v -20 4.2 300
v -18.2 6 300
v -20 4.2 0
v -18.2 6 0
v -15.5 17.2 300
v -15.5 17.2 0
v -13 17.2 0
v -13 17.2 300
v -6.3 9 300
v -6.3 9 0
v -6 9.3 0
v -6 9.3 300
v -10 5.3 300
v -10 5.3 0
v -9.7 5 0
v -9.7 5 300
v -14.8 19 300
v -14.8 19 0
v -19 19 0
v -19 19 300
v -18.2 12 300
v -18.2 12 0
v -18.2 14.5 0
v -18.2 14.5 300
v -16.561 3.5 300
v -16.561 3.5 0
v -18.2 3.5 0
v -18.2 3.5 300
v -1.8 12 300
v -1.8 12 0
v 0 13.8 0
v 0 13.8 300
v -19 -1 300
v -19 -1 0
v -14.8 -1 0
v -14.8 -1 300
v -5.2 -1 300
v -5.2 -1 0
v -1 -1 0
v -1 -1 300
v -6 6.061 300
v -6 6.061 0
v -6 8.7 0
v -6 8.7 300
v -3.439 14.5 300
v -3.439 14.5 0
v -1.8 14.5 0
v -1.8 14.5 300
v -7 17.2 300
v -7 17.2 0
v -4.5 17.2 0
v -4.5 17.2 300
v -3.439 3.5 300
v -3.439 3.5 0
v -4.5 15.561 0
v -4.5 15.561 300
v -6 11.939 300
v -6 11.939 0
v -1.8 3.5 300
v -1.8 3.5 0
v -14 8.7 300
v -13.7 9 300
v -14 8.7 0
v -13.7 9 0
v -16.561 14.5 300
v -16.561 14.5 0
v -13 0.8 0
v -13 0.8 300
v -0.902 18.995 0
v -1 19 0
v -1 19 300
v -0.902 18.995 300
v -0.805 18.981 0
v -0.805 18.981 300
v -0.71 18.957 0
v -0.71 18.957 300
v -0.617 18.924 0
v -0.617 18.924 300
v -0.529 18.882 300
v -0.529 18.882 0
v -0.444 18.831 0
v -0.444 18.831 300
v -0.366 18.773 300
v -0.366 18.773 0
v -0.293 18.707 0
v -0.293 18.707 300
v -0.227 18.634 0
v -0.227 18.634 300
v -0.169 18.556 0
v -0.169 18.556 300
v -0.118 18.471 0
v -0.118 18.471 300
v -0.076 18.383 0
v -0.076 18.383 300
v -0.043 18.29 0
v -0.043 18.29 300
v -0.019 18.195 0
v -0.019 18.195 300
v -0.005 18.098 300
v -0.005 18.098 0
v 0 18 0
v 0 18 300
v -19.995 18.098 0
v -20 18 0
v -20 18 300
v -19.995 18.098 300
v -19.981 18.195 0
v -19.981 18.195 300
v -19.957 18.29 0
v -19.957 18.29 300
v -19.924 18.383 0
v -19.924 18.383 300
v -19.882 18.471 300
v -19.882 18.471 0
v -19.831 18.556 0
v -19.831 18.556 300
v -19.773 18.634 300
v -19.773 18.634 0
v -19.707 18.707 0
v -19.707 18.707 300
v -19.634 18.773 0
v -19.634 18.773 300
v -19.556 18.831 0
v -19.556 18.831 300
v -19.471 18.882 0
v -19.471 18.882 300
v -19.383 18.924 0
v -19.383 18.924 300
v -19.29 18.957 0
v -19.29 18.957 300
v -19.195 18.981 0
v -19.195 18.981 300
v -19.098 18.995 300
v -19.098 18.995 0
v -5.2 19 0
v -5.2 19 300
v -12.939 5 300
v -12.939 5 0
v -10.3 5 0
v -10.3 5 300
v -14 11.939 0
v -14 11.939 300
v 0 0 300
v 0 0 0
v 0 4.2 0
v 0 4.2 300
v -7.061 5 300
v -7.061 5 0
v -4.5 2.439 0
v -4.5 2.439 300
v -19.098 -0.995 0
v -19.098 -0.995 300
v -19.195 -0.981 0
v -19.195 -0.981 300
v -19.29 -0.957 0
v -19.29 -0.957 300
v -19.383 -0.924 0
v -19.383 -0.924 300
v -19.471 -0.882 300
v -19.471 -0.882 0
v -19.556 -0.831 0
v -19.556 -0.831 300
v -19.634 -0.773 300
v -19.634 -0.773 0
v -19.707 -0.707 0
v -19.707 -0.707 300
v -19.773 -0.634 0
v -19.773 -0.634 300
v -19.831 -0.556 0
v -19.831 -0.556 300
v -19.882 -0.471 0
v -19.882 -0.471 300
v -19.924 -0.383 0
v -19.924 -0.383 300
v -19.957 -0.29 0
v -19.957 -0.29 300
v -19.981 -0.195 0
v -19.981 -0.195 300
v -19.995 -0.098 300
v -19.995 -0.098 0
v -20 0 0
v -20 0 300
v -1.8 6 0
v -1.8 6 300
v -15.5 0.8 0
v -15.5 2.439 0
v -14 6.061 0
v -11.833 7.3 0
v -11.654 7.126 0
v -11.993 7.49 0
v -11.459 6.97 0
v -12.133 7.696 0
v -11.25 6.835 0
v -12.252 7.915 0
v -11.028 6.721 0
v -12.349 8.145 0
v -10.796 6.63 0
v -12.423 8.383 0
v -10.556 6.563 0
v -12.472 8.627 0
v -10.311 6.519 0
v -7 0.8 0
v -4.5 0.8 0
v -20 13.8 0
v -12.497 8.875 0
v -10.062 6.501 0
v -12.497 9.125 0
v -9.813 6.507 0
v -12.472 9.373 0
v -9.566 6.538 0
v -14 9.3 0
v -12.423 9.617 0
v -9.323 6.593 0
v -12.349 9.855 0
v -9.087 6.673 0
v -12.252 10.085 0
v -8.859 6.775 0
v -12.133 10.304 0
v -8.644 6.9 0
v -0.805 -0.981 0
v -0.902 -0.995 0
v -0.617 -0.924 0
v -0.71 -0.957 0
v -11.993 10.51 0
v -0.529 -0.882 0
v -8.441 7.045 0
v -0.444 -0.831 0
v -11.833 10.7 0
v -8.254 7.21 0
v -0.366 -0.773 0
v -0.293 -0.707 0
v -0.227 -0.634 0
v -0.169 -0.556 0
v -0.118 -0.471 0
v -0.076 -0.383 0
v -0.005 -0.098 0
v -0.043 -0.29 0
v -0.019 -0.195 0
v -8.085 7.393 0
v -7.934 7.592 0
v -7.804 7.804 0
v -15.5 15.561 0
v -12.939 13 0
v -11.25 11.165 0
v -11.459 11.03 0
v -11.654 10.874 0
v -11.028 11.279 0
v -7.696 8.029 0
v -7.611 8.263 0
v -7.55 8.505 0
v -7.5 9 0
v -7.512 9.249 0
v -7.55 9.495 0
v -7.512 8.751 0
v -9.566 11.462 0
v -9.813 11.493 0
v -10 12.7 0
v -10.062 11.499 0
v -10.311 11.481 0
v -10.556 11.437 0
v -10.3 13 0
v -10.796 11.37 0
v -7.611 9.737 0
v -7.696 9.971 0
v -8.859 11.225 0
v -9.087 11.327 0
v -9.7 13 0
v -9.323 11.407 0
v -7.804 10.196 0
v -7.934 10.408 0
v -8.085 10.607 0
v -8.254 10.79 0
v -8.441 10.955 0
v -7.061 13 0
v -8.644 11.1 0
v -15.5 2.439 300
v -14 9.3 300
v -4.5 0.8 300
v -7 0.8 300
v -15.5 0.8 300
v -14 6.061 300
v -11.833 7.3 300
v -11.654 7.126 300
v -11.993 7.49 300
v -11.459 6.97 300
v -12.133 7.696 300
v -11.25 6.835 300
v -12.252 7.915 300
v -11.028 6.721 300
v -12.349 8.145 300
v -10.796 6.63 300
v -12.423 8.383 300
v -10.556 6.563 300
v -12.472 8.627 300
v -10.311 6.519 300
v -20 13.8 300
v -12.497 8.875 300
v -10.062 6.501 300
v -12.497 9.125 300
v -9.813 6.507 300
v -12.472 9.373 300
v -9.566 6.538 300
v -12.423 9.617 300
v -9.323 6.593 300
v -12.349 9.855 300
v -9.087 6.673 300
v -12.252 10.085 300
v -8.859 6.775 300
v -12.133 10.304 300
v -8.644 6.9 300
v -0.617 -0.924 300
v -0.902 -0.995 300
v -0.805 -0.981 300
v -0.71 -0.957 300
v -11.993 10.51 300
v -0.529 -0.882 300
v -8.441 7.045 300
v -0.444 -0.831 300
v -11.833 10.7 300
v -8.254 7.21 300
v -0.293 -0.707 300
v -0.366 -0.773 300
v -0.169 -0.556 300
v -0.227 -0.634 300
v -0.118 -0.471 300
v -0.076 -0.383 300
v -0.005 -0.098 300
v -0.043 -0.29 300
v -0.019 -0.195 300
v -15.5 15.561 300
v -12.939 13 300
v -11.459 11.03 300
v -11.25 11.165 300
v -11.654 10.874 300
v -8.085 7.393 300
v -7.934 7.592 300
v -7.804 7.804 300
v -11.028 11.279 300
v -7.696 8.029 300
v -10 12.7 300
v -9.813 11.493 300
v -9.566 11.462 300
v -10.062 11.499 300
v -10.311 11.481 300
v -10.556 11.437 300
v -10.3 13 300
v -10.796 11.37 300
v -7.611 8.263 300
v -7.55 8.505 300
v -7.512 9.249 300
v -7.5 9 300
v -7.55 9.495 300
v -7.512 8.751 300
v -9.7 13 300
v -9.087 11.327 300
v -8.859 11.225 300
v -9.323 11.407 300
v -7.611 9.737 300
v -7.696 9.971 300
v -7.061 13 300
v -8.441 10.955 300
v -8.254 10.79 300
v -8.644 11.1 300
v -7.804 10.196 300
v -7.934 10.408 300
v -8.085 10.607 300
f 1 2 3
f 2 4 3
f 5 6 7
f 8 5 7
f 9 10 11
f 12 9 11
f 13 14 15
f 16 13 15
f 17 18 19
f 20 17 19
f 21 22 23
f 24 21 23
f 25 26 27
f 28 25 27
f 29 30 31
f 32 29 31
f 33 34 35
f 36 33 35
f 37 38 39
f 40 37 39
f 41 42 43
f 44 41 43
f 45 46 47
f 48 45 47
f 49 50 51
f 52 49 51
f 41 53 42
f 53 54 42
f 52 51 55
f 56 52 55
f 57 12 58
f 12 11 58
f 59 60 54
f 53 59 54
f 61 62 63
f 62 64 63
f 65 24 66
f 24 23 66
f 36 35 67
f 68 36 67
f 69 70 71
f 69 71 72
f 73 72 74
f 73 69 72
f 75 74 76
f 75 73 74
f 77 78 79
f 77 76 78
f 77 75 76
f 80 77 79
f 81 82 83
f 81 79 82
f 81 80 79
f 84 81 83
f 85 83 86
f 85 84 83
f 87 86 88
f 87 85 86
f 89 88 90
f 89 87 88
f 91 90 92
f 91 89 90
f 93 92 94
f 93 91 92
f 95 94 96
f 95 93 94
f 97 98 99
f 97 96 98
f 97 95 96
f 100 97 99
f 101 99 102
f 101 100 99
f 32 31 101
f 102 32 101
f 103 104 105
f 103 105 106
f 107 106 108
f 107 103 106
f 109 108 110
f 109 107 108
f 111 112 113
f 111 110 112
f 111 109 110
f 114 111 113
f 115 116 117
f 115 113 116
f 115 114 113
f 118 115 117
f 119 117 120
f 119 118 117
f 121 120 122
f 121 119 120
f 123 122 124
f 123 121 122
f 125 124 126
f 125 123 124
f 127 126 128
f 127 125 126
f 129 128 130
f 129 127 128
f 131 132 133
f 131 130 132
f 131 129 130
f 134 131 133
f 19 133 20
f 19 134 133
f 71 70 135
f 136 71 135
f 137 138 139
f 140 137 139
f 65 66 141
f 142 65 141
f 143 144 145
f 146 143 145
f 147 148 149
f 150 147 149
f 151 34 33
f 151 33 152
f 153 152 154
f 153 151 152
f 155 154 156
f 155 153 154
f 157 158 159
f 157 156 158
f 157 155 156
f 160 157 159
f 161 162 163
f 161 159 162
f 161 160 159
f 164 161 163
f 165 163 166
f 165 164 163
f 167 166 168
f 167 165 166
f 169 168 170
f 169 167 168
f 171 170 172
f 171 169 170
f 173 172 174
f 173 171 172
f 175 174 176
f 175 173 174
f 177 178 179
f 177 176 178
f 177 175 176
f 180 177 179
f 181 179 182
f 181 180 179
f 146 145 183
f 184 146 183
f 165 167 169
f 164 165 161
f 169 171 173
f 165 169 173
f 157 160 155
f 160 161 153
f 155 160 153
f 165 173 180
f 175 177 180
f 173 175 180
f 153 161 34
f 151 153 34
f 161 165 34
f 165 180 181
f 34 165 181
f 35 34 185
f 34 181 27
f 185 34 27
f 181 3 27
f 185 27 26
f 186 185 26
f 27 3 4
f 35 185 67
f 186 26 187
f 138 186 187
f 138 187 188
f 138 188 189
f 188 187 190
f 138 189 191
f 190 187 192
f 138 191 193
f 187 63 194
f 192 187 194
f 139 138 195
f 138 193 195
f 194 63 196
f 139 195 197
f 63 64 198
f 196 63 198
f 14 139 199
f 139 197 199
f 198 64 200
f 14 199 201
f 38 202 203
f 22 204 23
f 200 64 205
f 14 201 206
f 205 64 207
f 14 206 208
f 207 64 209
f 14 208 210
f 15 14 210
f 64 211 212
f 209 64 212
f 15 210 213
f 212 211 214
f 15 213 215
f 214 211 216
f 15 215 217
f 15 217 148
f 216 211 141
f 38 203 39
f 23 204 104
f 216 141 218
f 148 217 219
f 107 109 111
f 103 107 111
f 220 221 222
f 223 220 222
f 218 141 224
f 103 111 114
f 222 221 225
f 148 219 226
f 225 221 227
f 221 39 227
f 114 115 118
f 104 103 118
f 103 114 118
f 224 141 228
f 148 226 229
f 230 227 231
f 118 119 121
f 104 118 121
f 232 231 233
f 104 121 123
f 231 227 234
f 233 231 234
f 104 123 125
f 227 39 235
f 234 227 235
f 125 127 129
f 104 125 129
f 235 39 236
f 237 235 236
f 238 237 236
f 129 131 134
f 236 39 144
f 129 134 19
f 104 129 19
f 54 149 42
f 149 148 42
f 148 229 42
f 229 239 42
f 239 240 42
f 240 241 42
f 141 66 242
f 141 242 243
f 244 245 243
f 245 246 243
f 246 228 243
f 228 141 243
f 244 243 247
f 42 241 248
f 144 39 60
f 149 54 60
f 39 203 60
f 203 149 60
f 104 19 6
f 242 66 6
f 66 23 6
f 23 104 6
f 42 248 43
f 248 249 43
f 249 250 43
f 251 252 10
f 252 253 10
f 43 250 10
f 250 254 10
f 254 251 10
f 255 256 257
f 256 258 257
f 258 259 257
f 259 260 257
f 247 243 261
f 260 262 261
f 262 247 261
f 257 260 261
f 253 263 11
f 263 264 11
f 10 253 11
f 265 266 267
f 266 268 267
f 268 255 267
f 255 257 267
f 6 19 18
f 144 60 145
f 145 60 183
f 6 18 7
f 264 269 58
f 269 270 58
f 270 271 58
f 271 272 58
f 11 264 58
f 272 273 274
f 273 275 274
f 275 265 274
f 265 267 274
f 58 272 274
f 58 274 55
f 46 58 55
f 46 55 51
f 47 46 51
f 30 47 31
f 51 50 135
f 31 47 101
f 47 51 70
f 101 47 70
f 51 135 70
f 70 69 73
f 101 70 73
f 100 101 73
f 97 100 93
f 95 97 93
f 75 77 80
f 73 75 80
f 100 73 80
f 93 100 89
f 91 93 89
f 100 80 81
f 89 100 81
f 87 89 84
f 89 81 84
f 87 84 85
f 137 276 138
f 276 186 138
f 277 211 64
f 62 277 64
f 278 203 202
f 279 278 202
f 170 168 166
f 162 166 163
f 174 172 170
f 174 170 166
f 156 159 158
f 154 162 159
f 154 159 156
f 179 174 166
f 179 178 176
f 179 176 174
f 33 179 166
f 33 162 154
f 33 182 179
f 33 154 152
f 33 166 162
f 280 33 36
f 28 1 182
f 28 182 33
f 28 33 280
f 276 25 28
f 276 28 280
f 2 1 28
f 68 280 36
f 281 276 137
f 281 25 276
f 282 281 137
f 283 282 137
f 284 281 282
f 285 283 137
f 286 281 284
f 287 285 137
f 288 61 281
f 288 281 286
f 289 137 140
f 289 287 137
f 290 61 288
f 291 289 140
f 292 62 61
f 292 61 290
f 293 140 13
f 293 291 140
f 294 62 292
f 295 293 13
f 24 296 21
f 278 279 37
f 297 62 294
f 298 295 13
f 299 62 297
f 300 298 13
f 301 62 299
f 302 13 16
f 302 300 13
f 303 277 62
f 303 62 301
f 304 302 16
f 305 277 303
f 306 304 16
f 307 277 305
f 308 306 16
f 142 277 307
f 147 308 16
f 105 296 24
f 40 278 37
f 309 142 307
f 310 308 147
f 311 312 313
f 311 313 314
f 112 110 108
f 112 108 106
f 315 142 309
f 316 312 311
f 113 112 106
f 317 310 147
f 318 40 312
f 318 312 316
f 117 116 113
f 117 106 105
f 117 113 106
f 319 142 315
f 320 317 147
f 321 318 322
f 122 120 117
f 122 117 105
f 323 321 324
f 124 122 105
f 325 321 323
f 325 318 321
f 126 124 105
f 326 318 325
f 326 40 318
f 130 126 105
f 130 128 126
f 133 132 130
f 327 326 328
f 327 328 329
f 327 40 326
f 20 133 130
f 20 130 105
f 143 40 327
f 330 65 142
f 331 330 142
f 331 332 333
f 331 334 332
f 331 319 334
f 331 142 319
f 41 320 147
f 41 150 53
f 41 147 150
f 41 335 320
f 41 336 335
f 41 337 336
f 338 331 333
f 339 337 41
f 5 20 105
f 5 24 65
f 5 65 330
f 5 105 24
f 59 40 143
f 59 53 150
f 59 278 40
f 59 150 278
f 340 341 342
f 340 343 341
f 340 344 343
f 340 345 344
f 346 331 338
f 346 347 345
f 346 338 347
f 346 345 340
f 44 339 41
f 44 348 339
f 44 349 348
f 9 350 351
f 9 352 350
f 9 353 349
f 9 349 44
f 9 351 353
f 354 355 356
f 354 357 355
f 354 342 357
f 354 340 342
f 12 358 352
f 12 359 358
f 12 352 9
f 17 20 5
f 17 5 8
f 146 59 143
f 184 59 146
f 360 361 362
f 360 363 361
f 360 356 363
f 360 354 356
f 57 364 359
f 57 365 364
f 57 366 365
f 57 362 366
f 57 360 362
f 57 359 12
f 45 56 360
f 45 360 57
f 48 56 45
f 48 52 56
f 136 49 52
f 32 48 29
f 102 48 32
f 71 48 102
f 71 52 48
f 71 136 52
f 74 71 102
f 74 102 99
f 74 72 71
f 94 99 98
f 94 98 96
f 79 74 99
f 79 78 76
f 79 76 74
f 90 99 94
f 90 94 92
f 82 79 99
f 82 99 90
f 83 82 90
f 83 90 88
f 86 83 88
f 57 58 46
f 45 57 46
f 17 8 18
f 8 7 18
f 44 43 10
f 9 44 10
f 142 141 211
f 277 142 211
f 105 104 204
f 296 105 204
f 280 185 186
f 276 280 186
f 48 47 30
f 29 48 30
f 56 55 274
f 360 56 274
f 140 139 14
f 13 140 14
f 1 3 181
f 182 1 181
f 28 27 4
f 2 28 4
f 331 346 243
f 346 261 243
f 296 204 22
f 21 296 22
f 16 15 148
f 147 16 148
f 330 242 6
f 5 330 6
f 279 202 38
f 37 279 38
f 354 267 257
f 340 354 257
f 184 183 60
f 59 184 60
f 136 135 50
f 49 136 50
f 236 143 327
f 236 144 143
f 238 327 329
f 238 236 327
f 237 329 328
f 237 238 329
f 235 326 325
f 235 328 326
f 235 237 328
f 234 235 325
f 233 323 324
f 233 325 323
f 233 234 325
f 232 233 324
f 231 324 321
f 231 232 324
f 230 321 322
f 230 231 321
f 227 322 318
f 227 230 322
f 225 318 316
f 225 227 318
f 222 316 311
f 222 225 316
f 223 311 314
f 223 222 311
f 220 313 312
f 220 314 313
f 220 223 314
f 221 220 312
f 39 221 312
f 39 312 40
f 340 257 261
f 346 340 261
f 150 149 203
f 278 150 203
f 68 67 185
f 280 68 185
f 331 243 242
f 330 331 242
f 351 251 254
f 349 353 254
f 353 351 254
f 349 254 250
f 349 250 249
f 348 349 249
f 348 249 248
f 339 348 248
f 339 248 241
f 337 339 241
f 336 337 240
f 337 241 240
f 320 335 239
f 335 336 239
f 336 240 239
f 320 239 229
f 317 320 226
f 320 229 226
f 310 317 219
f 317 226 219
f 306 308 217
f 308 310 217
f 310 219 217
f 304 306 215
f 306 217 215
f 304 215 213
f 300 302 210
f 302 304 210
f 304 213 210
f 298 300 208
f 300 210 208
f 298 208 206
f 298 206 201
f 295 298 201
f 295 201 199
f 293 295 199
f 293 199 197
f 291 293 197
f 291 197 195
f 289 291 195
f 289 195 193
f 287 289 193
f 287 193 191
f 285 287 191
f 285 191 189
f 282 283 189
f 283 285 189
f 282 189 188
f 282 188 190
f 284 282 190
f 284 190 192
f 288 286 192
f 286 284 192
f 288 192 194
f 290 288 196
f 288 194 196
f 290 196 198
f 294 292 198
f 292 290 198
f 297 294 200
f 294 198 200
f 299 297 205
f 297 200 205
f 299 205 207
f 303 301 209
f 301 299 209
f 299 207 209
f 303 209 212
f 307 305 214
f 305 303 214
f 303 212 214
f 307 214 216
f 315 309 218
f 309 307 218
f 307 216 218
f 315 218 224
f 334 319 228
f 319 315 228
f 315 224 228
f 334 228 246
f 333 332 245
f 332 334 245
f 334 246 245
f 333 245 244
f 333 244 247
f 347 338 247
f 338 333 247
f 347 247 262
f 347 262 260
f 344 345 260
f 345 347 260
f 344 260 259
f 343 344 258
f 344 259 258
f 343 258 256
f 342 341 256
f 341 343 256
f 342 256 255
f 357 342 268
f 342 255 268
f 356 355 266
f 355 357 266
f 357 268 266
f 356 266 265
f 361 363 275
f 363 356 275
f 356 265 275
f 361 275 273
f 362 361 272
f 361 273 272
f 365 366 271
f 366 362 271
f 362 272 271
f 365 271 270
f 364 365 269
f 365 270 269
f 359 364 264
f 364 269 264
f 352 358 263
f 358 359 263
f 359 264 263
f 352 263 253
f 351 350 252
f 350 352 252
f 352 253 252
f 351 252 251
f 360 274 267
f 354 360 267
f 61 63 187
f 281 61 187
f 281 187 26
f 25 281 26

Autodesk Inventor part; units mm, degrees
ref_plane "YZ Plane" through (0, 0, 0) normal (1, 0, 0) x (0, 1, 0)
ref_plane "XZ Plane" through (0, 0, 0) normal (0, 1, 0) x (-1, 0, 0)
ref_plane "XY Plane" through (0, 0, 0) normal (0, 0, 1) x (1, 0, 0)
sketch "Sketch1" plane through (0, 0, 0) normal (0, 0, 1) x (1, 0, 0)
  line L0 (-14, 8.7) -> (-14, 6.0607)
  line L1 (-14, 8.7) -> (-14, 6.0607)
  line L2 (-14, 6.0607) -> (-16.5607, 3.5)
  line L3 (-14, 6.0607) -> (-16.5607, 3.5)
  line L4 (-16.5607, 3.5) -> (-18.2, 3.5)
  line L5 (-16.5607, 3.5) -> (-18.2, 3.5)
  line L6 (-18.2, 3.5) -> (-18.2, 6)
  line L7 (-18.2, 3.5) -> (-18.2, 6)
  line L8 (-20, 4.2) -> (-20, 0)
  line L9 (-18.2, 6) -> (-20, 4.2)
  line L10 (-20, 4.2) -> (-20, 0)
  line L11 (-19, -1) -> (-14.8, -1)
  line L12 (-19, -1) -> (-14.8, -1)
  line L13 (-14.8, -1) -> (-13, 0.8)
  line L14 (-14.8, -1) -> (-13, 0.8)
  line L15 (-15.5, 0.8) -> (-15.5, 2.4393)
  line L16 (-13, 0.8) -> (-15.5, 0.8)
  line L17 (-15.5, 0.8) -> (-15.5, 2.4393)
  line L18 (-12.9393, 5) -> (-10.3, 5)
  line L19 (-15.5, 2.4393) -> (-12.9393, 5)
  line L20 (-12.9393, 5) -> (-10.3, 5)
  line L21 (-10, 5.3) -> (-9.7, 5)
  line L22 (-10.3, 5) -> (-10, 5.3)
  line L23 (-13.7, 9) -> (-14, 8.7)
  line L24 (-13.7, 9) -> (-14, 8.7)
  line L25 (-10, 9) -> (-10, 10.0607)
  circle A0 centre (-10, 9) radius 2.5
  arc A1 (-20, 0) -> (-19, -1) centre (-19, 0) ccw
  arc A2 (-20, 0) -> (-19, -1) centre (-19, 0) ccw
  line L26 (-7.0607, 5) -> (-4.5, 2.4393)
  line L27 (-4.5, 2.4393) -> (-4.5, 0.8)
  line L28 (-4.5, 0.8) -> (-7, 0.8)
  line L29 (-7, 0.8) -> (-5.2, -1)
  line L30 (-3.4393, 3.5) -> (-6, 6.0607)
  line L31 (-1.8, 6) -> (-1.8, 3.5)
  line L32 (-1.8, 3.5) -> (-3.4393, 3.5)
  line L33 (0, 4.2) -> (-1.8, 6)
  line L34 (-5.2, -1) -> (-1, -1)
  line L35 (0, 0) -> (0, 4.2)
  arc A3 (-1, -1) -> (0, 0) centre (-1, 0) ccw
  line L36 (-9.7, 5) -> (-7.0607, 5)
  line L37 (-6, 6.0607) -> (-6, 8.7)
  line L38 (-6, 8.7) -> (-6.3, 9)
  line L39 (-10, 5.3) -> (-9.7, 5)
  line L40 (-6, 11.9393) -> (-3.4393, 14.5)
  line L41 (-3.4393, 14.5) -> (-1.8, 14.5)
  line L42 (-1.8, 14.5) -> (-1.8, 12)
  line L43 (-1.8, 12) -> (0, 13.8)
  line L44 (-4.5, 15.5607) -> (-7.0607, 13)
  line L45 (-7, 17.2) -> (-4.5, 17.2)
  line L46 (-4.5, 17.2) -> (-4.5, 15.5607)
  line L47 (-5.2, 19) -> (-7, 17.2)
  line L48 (0, 13.8) -> (0, 18)
  line L49 (-1, 19) -> (-5.2, 19)
  arc A4 (0, 18) -> (-1, 19) centre (-1, 18) ccw
  line L50 (-6, 9.3) -> (-6, 11.9393)
  line L51 (-7.0607, 13) -> (-9.7, 13)
  line L52 (-9.7, 13) -> (-10, 12.7)
  line L53 (-6.3, 9) -> (-6, 9.3)
  line L54 (-12.9393, 13) -> (-15.5, 15.5607)
  line L55 (-15.5, 15.5607) -> (-15.5, 17.2)
  line L56 (-15.5, 17.2) -> (-13, 17.2)
  line L57 (-13, 17.2) -> (-14.8, 19)
  line L58 (-16.5607, 14.5) -> (-14, 11.9393)
  line L59 (-18.2, 12) -> (-18.2, 14.5)
  line L60 (-18.2, 14.5) -> (-16.5607, 14.5)
  line L61 (-20, 13.8) -> (-18.2, 12)
  line L62 (-14.8, 19) -> (-19, 19)
  line L63 (-20, 18) -> (-20, 13.8)
  arc A5 (-19, 19) -> (-20, 18) centre (-19, 18) ccw
  line L64 (-10.3, 13) -> (-12.9393, 13)
  line L65 (-14, 11.9393) -> (-14, 9.3)
  line L66 (-14, 9.3) -> (-13.7, 9)
  line L67 (-10, 12.7) -> (-10.3, 13)
  point P0 (0, 0)
  point P1 (-1, 0)
  point P2 (-1, 18)
  point P3 (-19, 18)
  dimension "d2" = 360
extrude "Extrusion1" add sketch "Sketch1" along normal blind 300
properties part number "20x20x300" material "Aluminum 6061"
